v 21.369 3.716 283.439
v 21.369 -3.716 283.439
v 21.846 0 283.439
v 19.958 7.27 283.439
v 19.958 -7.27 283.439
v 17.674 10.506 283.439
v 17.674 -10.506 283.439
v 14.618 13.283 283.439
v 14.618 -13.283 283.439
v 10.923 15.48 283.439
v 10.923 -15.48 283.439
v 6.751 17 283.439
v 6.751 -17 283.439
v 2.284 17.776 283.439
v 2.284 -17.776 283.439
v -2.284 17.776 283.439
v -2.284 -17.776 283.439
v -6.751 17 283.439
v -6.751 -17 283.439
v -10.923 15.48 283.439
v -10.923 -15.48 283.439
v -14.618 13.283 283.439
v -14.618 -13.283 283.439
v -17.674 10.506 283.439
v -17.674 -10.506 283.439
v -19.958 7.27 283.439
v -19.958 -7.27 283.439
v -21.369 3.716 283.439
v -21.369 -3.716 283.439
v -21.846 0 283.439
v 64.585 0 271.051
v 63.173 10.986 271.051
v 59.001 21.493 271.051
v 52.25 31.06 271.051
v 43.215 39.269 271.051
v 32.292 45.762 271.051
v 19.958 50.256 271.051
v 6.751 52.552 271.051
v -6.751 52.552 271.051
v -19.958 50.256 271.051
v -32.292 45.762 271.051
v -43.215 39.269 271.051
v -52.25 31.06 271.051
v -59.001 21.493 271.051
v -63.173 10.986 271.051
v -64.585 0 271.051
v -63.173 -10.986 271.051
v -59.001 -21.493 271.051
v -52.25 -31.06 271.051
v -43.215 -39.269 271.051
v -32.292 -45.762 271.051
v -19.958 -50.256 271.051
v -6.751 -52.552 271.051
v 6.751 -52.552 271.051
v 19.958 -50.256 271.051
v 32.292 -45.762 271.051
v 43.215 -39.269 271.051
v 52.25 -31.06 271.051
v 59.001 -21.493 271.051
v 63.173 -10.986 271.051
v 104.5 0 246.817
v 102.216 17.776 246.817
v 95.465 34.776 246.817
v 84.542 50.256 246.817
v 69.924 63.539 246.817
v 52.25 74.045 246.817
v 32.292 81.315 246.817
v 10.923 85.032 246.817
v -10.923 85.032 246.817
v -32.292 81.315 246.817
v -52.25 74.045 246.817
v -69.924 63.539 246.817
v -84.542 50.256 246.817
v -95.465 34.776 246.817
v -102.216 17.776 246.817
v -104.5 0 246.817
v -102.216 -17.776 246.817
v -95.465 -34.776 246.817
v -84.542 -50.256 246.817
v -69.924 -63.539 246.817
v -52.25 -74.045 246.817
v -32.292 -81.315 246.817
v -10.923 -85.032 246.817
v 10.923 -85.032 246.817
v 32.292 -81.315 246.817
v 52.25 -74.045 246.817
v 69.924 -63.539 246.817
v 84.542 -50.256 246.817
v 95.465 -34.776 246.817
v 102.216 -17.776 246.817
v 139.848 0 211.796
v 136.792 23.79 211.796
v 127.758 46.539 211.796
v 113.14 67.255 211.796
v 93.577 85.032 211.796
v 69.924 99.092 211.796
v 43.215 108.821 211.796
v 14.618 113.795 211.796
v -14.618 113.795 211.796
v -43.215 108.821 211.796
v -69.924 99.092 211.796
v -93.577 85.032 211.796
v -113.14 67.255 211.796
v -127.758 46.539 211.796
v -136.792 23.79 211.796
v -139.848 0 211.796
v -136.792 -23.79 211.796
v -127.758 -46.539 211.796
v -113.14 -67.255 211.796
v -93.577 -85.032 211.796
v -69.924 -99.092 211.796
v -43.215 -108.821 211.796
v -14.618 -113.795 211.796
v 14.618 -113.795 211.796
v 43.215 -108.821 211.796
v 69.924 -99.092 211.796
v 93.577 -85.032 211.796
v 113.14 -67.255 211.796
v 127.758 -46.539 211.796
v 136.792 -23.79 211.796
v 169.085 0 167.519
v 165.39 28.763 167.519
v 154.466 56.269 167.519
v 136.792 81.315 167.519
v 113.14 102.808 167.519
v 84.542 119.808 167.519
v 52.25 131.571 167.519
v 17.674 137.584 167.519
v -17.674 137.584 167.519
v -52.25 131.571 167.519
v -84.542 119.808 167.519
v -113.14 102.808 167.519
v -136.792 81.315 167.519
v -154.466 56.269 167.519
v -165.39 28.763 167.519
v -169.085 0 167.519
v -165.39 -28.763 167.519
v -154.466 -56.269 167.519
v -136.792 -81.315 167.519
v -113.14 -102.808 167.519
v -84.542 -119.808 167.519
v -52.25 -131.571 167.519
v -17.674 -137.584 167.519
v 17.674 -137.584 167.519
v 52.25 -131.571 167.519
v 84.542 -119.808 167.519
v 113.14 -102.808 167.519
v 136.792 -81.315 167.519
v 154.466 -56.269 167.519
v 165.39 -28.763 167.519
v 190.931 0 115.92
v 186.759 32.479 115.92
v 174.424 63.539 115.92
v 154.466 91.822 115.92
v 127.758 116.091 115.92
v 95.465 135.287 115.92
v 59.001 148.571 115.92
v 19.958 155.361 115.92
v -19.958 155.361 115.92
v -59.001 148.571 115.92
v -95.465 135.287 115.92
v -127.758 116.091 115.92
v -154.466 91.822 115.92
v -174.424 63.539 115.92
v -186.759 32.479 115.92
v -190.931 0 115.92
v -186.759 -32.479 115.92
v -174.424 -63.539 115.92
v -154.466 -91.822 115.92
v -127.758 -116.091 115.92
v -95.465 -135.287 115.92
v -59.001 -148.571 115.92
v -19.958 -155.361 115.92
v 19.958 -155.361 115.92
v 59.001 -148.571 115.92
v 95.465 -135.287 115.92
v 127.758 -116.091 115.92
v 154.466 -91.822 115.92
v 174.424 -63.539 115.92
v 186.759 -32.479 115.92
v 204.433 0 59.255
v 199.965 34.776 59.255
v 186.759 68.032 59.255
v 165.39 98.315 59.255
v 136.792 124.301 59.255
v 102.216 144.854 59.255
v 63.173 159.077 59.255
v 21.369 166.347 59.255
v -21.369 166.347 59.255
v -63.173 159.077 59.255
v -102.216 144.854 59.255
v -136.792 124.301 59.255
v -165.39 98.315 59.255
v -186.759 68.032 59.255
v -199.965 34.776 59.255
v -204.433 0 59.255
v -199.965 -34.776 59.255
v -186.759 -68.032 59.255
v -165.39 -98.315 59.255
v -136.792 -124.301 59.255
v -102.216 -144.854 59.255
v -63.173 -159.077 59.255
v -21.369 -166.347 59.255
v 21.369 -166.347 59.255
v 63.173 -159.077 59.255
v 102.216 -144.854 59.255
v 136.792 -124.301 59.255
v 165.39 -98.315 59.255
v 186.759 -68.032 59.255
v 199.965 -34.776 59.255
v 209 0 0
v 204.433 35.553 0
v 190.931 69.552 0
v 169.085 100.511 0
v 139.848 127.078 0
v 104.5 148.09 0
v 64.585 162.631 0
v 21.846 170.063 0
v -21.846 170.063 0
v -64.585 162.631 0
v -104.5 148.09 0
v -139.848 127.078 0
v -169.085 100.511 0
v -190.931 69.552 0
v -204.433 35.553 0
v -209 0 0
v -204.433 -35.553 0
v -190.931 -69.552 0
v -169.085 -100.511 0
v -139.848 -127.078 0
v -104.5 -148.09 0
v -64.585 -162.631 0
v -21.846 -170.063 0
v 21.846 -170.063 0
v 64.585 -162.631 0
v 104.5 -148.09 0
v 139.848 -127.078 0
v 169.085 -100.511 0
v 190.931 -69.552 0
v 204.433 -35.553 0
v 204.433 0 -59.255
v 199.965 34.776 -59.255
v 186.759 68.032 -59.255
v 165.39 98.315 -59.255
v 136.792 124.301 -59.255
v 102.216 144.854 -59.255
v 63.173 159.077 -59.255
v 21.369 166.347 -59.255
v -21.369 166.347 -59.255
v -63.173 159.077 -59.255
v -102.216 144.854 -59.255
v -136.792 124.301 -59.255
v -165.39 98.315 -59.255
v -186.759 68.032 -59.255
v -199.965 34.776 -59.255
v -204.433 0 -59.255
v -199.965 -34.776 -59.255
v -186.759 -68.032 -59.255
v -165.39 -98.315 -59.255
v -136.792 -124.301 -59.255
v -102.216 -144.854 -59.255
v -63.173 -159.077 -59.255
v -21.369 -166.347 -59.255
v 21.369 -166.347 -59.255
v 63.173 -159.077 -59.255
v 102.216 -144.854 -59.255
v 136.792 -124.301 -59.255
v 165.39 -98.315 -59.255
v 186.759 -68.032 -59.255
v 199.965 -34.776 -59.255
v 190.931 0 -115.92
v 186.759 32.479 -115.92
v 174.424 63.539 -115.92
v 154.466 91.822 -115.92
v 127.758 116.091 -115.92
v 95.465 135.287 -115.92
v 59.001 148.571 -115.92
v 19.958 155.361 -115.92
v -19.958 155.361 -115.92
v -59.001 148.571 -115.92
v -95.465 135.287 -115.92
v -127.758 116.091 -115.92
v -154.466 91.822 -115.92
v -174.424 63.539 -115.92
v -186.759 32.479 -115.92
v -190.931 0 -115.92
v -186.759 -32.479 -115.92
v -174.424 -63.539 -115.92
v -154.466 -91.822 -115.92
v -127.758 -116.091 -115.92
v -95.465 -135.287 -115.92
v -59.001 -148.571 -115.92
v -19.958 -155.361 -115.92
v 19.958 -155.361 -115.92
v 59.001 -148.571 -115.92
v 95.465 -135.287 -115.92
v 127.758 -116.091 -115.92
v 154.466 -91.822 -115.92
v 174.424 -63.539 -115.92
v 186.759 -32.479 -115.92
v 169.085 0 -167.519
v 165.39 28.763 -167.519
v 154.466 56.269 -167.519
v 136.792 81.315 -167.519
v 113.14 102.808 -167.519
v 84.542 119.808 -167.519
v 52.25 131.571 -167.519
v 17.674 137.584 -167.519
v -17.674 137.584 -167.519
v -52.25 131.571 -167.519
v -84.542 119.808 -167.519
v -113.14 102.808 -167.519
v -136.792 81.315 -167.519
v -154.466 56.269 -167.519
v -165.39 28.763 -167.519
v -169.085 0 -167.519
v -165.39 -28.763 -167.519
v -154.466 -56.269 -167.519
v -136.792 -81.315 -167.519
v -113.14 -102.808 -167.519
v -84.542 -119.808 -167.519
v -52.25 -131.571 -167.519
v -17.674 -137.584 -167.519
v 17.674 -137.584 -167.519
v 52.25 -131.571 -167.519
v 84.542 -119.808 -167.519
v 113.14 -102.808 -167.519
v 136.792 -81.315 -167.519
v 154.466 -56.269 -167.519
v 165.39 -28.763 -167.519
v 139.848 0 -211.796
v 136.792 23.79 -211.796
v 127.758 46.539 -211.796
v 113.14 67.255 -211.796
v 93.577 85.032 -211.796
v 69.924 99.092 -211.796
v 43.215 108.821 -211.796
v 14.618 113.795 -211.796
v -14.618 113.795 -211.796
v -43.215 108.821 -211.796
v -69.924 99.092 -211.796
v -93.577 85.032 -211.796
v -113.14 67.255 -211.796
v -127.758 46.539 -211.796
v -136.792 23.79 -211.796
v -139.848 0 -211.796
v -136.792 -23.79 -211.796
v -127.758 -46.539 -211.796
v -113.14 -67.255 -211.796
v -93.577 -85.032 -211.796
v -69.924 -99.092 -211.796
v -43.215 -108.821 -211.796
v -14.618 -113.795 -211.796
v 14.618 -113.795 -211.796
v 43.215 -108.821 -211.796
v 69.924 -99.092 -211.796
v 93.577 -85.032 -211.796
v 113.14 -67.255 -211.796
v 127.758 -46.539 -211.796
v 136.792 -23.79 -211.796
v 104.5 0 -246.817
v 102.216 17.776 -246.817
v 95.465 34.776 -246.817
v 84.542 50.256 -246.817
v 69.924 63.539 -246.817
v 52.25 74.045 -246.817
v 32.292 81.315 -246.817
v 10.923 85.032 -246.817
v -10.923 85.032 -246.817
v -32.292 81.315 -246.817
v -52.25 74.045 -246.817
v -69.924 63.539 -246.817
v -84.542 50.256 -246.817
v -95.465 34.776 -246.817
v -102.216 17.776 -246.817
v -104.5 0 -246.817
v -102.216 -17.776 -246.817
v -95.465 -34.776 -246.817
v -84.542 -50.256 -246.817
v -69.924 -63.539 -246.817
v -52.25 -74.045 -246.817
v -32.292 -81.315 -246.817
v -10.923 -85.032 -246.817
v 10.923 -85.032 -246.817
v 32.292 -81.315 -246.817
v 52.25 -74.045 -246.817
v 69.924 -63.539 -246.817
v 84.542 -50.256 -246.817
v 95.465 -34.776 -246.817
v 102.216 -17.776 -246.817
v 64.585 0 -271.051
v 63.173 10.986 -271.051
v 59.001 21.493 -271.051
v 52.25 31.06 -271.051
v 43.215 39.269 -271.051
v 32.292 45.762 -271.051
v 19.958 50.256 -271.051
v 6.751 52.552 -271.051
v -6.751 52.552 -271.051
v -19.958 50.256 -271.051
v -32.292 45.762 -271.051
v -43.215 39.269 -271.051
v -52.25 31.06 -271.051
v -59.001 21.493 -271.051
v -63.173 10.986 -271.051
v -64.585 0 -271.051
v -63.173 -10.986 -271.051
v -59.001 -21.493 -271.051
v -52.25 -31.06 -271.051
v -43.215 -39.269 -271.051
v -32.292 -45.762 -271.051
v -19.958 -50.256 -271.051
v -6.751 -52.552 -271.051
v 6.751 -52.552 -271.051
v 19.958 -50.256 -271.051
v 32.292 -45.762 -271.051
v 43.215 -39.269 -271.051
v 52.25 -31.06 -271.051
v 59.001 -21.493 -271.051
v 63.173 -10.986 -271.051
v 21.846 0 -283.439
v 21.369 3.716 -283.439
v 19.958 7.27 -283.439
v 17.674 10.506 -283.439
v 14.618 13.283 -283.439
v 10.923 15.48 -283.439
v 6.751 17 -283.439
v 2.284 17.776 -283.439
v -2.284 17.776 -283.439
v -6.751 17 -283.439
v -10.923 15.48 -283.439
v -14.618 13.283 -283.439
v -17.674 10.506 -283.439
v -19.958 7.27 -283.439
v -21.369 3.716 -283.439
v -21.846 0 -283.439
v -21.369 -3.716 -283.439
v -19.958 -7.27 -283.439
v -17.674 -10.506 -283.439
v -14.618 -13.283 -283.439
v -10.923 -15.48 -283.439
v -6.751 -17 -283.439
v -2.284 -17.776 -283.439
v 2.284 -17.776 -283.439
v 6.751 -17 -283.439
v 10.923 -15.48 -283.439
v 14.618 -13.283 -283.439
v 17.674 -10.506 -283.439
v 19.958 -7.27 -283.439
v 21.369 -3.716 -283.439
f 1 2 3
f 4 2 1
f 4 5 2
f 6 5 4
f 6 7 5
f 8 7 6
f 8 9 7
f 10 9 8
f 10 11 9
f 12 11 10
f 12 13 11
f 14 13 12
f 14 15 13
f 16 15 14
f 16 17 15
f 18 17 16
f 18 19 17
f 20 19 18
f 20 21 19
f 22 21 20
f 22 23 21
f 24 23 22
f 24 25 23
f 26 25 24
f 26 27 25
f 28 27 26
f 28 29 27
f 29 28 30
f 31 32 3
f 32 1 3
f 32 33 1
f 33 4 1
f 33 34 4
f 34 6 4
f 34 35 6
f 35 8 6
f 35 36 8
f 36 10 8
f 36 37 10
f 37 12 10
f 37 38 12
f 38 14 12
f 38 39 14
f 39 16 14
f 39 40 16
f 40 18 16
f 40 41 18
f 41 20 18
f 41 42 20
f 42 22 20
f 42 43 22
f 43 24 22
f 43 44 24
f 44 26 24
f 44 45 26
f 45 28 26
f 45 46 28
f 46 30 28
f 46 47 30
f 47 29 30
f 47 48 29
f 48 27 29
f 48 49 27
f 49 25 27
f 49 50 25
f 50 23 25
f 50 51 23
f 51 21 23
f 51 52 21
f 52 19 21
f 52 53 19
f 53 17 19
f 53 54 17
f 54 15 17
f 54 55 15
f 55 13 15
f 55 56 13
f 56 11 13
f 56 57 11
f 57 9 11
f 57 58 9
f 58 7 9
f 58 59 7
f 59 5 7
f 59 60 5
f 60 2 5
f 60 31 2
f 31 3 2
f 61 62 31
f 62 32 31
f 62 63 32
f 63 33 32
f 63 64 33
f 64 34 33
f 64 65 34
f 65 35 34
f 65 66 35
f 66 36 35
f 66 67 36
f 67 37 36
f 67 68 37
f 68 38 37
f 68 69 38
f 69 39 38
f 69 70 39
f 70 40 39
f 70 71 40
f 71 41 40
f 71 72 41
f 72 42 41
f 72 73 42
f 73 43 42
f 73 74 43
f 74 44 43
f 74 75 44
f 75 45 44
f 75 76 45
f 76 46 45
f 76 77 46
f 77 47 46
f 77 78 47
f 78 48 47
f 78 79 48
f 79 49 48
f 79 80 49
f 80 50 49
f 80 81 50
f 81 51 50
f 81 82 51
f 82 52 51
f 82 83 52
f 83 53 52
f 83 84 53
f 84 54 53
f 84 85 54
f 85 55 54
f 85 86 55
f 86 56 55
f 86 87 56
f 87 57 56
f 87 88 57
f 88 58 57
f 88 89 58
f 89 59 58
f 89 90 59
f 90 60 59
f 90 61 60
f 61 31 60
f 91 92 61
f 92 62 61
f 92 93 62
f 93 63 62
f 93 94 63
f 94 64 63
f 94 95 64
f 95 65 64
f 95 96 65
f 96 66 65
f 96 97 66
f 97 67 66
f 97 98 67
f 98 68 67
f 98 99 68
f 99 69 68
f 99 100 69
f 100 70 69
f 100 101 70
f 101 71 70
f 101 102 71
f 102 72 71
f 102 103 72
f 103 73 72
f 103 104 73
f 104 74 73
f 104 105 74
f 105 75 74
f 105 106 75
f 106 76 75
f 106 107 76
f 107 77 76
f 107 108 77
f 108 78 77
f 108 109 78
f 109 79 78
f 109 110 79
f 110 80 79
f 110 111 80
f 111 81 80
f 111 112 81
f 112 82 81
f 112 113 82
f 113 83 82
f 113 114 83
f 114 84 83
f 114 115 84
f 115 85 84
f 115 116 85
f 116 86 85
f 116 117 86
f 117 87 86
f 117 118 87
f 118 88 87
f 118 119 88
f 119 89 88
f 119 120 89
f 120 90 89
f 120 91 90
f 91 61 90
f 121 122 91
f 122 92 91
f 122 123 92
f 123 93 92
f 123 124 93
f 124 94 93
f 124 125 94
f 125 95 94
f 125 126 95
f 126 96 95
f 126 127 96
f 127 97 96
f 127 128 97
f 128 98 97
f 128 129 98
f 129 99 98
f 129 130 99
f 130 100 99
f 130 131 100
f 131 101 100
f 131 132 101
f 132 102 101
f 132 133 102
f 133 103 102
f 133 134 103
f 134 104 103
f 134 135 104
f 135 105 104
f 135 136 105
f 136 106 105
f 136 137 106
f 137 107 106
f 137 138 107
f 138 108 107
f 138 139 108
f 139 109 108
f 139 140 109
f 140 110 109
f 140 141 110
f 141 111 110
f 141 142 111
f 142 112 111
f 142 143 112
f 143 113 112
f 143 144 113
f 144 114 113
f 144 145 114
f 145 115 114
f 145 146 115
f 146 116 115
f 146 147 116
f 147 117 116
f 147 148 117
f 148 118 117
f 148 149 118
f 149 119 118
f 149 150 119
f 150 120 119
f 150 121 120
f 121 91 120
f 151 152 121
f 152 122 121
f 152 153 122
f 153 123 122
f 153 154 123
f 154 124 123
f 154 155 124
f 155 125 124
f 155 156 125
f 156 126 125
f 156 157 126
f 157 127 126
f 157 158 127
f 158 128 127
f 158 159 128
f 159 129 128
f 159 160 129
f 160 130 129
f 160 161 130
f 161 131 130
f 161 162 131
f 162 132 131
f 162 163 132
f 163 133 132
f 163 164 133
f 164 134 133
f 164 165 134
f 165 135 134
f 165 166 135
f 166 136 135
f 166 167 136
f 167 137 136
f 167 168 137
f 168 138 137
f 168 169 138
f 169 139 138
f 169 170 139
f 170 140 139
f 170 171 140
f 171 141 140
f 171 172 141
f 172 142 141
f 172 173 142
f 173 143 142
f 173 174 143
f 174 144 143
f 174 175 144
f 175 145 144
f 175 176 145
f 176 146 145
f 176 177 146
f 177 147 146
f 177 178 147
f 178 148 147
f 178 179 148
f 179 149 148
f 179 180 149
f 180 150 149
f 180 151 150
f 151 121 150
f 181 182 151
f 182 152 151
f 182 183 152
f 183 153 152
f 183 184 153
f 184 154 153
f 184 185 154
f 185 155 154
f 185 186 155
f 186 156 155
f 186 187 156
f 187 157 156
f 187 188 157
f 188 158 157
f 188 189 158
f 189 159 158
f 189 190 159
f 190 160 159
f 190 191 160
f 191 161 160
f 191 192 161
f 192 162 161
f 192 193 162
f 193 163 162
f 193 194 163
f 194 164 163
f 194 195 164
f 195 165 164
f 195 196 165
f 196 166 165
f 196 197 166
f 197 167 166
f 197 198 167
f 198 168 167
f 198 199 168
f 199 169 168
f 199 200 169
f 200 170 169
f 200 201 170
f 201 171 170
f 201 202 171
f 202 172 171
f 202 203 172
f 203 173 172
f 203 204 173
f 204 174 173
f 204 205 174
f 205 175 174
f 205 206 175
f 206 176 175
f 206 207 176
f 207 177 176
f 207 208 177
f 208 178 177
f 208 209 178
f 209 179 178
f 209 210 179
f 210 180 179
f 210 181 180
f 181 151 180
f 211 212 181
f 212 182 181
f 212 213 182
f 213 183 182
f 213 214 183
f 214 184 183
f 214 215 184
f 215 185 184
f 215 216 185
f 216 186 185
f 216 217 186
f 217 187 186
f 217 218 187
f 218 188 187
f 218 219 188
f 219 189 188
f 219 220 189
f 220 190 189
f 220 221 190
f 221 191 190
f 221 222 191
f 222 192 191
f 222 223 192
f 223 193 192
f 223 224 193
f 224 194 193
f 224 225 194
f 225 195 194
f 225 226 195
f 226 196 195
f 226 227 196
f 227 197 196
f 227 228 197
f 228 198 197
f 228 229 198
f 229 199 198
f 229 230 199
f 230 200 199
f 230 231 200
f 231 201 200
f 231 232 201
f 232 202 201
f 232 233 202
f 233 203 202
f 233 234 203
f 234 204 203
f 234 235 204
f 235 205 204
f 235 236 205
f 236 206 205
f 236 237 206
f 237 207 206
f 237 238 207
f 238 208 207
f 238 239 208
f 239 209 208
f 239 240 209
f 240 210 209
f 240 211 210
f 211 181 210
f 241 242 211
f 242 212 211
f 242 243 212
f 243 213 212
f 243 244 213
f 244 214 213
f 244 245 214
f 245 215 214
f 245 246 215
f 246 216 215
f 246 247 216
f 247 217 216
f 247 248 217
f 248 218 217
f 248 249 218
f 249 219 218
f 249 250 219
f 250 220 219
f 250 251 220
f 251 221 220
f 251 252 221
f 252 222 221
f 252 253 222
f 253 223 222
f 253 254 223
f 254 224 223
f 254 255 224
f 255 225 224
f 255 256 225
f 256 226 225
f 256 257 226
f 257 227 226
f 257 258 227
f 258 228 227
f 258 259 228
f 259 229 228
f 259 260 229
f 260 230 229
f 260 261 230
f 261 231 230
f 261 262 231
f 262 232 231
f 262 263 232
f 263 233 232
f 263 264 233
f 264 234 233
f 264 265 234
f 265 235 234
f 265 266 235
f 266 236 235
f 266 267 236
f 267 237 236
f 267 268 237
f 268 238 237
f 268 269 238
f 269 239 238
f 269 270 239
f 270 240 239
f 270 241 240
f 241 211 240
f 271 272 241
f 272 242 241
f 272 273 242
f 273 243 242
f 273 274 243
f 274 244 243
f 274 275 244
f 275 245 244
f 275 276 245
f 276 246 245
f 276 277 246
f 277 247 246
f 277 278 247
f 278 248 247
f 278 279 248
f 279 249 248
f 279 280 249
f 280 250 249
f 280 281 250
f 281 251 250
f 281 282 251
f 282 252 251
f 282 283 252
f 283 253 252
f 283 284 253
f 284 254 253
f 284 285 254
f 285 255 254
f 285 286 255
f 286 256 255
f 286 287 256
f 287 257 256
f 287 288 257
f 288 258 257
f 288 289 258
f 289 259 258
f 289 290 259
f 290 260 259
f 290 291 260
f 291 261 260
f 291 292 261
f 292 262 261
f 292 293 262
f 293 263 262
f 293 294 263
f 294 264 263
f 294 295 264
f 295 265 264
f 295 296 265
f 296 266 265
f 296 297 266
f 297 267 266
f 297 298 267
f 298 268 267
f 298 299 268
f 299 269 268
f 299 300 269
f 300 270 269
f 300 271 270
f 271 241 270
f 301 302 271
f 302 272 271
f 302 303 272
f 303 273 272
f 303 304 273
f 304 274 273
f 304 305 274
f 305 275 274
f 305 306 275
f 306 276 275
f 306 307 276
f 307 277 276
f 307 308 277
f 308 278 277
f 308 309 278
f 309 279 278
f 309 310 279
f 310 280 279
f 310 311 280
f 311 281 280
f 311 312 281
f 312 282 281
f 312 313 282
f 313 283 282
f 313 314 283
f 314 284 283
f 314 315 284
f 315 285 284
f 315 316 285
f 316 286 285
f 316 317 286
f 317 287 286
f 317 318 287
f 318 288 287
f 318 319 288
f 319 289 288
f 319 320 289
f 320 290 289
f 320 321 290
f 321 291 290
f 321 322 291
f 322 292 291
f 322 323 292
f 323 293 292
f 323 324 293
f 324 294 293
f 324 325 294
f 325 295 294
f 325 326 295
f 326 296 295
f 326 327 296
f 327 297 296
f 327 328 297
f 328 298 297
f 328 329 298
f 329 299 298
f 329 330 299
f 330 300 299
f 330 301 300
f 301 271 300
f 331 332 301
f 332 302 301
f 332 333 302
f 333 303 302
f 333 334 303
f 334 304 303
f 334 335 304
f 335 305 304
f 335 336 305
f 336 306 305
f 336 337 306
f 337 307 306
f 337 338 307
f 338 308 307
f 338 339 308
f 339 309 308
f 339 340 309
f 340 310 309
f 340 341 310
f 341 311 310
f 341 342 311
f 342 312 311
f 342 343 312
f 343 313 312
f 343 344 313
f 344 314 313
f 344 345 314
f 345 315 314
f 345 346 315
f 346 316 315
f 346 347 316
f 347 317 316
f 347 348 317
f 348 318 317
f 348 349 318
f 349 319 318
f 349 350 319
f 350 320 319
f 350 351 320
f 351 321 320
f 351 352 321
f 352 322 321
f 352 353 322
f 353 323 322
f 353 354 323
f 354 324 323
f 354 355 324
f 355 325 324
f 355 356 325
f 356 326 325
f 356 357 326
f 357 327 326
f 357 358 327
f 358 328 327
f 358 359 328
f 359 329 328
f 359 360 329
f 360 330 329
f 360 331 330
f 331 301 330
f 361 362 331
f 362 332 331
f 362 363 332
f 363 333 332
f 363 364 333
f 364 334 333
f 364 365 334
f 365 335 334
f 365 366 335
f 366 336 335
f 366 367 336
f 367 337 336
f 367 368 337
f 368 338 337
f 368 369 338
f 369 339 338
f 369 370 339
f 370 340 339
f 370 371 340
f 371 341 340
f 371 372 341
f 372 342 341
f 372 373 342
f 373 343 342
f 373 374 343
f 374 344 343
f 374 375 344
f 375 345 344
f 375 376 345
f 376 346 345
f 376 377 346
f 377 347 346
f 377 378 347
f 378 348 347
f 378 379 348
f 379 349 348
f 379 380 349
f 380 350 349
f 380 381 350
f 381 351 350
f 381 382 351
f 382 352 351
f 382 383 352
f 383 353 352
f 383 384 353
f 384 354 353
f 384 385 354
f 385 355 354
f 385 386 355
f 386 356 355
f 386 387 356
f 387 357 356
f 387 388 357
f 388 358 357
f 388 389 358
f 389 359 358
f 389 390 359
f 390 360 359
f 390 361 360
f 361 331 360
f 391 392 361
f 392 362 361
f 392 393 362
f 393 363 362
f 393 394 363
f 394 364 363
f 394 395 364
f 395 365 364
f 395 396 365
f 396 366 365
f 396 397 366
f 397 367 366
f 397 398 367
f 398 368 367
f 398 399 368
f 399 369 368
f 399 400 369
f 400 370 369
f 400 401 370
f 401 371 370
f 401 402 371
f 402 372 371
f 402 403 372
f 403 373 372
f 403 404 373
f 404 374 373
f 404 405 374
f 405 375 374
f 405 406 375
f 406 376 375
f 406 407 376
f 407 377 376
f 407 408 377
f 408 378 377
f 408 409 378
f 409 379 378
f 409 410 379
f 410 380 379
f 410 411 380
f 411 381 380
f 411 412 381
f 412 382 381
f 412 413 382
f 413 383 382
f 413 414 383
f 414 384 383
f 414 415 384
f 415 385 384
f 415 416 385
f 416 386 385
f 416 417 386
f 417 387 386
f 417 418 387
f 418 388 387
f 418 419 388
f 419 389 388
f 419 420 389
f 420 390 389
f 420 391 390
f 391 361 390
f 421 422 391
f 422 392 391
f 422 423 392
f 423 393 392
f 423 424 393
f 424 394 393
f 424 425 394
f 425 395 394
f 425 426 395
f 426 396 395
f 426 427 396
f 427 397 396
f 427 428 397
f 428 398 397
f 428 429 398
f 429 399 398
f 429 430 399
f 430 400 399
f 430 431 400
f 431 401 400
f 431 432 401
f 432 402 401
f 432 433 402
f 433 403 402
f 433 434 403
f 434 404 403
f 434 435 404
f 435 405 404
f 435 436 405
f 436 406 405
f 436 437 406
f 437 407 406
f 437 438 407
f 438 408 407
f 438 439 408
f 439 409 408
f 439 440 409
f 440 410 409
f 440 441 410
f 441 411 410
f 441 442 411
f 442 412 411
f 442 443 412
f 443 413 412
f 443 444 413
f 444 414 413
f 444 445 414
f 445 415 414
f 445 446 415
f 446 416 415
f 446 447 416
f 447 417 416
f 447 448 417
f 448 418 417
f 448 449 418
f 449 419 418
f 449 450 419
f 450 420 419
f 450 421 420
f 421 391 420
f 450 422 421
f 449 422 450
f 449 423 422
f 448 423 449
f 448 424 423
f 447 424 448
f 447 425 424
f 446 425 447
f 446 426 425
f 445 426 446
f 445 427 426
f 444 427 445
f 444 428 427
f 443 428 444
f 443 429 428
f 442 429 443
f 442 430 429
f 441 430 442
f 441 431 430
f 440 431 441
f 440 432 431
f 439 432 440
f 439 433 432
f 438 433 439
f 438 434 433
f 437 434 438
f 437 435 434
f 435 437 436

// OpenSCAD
// Generated by SolidPython 1.0.1 on 2020-07-29 00:46:49


scale(v = [11, 9, 15]) {
	sphere(r = 19);
}
/***********************************************
*********      SolidPython code:      **********
************************************************
 
# import packages: SolidPython
from solid import *
from solid.utils import *
from itertools import chain, combinations, permutations


class Resize:

    def __init__(self, scad_file):
        self.scad_file = scad_file
        #self.scad_file = import_scad(scad_file)
        # cone/cylinder param:
        self.r1 = 0
        self.r2 = 0
        self.h = 0
        # rectangular prism param:
        self.w = 0
        self.l = 0
        # ellipse param:
        self.r = 0

    # import OpenScad code (file name corresponds to shape)


    # classify shape + parameters
    def assign(self, param1, param2, param3):
        if self.scad_file == 'cone.scad':
            self.r1 = param1
            self.r2 = param2
            self.h = param3
        elif self.scad_file == 'cylinder.scad':
            self.r1 = param1
            self.r2 = param2
            self.h = param3
        elif self.scad_file == 'rectangularPrism.scad':
            self.h = param1
            self.l = param2
            self.w = param3
        else:
            self.r = param1
            self.h = param2

    # resize parameters
    def iterate(self):
        x = range(3, 20, 2)
        i = 1
        if self.scad_file == 'cone.scad':
            tempList = list(permutations(x, 2))
            for temp in tempList:
                param1 = temp[0]
                param2 = temp[1]
                filepath = 'produced_scad_files/' + 'cone' + str(param1) + '_' + str(param2) + '_' + '.scad'
                scad_render_to_file(cylinder(h=param1, r1=param2, r2=0), filepath)

        elif self.scad_file == 'cylinder.scad':
            tempList = list(permutations(x, 3))
            for temp in tempList:
                param1 = temp[0]
                param2 = temp[1]
                filepath = 'produced_scad_files/' + 'cylinder' + str(param1) + '_' + str(param2) + '_' + '.scad'
                scad_render_to_file(cylinder(h=param1, r1=param2, r2=param2), filepath)

        elif self.scad_file == 'rectangularPrism.scad':
            tempList = list(permutations(x, 3))
            for temp in tempList:
                param1 = temp[0]
                param2 = temp[1]
                param3 = temp[2]
                filepath = 'produced_scad_files/' + 'rectangularPrism' + str(param1) + '_' + str(param2) + '_' + str(
                    param3) + '.scad'
                scad_render_to_file(cube(size=(param1, param2, param3)), filepath)

        elif self.scad_file == 'ellipse.scad':
            tempList = list(permutations(x, 4))
            for temp in tempList:
                param1 = temp[0]
                param2 = temp[1]
                param3 = temp[2]
                param4 = temp[3]
                filepath = 'produced_scad_files/' + 'ellipse' + str(param1) + '_' + str(param2) + '_' + str(param3) + '_' + str(param4) + '.scad'
                scad_render_to_file(scale([param1, param2, param3])(sphere(r=param4)), filepath)

    def render_to_scadfile(self):
        scad_render_to_file(scad, 'example.scad') 
 
************************************************/
